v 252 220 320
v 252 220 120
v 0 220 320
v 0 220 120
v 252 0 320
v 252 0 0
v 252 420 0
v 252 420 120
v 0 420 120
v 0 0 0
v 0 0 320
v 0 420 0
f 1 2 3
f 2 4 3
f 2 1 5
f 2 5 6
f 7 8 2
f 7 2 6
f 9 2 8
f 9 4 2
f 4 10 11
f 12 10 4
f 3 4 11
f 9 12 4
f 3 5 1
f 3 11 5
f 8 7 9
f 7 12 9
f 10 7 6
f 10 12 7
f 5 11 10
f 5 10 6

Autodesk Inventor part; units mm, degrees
ref_plane "YZ Plane" through (0, 0, 0) normal (1, 0, 0) x (0, 1, 0)
ref_plane "XZ Plane" through (0, 0, 0) normal (0, 1, 0) x (-1, 0, 0)
ref_plane "XY Plane" through (0, 0, 0) normal (0, 0, 1) x (1, 0, 0)
sketch "Sketch2" plane through (0, 0, 0) normal (0, 0, 1) x (1, 0, 0)
  line L0 (0, 0) -> (180, 0)
  line L1 (180, 0) -> (180, 220)
  line L2 (180, 220) -> (0, 220)
  line L3 (0, 220) -> (0, 0)
  dimension "d4" = 220
  dimension "d5" = 180
extrude "Extrusion2" add sketch "Sketch2" along normal blind 320
sketch "Sketch3" plane through (0, 220, 0) normal (0, 1, 0) x (1, 0, 0)
  line L0 (0, 0) -> (180, 0) projected
  line L1 (180, 0) -> (180, -320) projected
  line L2 (0, 0) -> (180, 0)
  line L3 (180, 0) -> (180, -120)
  line L4 (180, -120) -> (0, -120)
  line L5 (0, -120) -> (0, 0)
  dimension "d8" = 120
extrude "Extrusion3" add sketch "Sketch3" along normal blind 200
sketch "Sketch4" plane through (0, 0, 0) normal (0, -1, 0) x (1, 0, 0)
  line L0 (0, 0) -> (180, 0) projected
  line L1 (180, 0) -> (180, 320) projected
  line L2 (0, 0) -> (180, 0)
  line L3 (180, 0) -> (180, 320)
  line L4 (180, 320) -> (0, 320)
  line L5 (0, 320) -> (0, 0)
extrude "Extrusion4" add sketch "Sketch4" along normal blind 20
sketch "Sketch5" plane through (0, -20, 0) normal (0, -1, 0) x (1, 0, 0)
  line L0 (180, 320) -> (0, 320) projected
  line L1 (180, 120) -> (180, 0) projected
  line L2 (0, 320) -> (180, 320)
  line L3 (180, 320) -> (180, 0)
  line L4 (180, 0) -> (0, 0)
  line L5 (0, 0) -> (0, 320)
extrude "Extrusion5" add sketch "Sketch5" along normal blind 40
sketch "Sketch6" plane through (180, 220, 120) normal (1, 0, 0) x (0, 0, -1)
  line L0 (0, 0) -> (-200, 0) projected
  line L1 (-200, 0) -> (0, 0)
  line L2 (120, 200) -> (0, 200) projected
  line L3 (0, 0) -> (0, 200)
  line L4 (0, 200) -> (120, 200)
  line L5 (120, 200) -> (120, -280) projected
  line L6 (120, 200) -> (120, -280)
  line L7 (120, -280) -> (-200, -280) projected
  line L8 (120, -280) -> (-200, -280)
  line L9 (-200, -280) -> (-200, 0)
  point P0 (120, -220)
extrude "Extrusion6" add sketch "Sketch6" along normal blind 72
sketch "Sketch7" plane through (0, -60, 0) normal (0, -1, 0) x (1, 0, 0)
  line L0 (0, 0) -> (252, 0) projected
  line L1 (0, 320) -> (252, 320)
  line L2 (252, 320) -> (252, 0)
  line L3 (252, 0) -> (0, 0)
  line L4 (0, 0) -> (0, 320)
extrude "Extrusion7" cut sketch "Sketch7" against normal blind 40
sketch "Sketch8" plane through (0, -20, 0) normal (0, -1, 0) x (1, 0, 0)
  line L0 (0, 120) -> (0, 320) projected
  line L1 (0, 0) -> (252, 0) projected
  line L2 (0, 320) -> (252, 320)
  line L3 (252, 320) -> (252, 0)
  line L4 (252, 0) -> (0, 0)
  line L5 (0, 0) -> (0, 320)
extrude "Extrusion8" cut sketch "Sketch8" against normal blind 20
properties part number "Fuel tank newest"
